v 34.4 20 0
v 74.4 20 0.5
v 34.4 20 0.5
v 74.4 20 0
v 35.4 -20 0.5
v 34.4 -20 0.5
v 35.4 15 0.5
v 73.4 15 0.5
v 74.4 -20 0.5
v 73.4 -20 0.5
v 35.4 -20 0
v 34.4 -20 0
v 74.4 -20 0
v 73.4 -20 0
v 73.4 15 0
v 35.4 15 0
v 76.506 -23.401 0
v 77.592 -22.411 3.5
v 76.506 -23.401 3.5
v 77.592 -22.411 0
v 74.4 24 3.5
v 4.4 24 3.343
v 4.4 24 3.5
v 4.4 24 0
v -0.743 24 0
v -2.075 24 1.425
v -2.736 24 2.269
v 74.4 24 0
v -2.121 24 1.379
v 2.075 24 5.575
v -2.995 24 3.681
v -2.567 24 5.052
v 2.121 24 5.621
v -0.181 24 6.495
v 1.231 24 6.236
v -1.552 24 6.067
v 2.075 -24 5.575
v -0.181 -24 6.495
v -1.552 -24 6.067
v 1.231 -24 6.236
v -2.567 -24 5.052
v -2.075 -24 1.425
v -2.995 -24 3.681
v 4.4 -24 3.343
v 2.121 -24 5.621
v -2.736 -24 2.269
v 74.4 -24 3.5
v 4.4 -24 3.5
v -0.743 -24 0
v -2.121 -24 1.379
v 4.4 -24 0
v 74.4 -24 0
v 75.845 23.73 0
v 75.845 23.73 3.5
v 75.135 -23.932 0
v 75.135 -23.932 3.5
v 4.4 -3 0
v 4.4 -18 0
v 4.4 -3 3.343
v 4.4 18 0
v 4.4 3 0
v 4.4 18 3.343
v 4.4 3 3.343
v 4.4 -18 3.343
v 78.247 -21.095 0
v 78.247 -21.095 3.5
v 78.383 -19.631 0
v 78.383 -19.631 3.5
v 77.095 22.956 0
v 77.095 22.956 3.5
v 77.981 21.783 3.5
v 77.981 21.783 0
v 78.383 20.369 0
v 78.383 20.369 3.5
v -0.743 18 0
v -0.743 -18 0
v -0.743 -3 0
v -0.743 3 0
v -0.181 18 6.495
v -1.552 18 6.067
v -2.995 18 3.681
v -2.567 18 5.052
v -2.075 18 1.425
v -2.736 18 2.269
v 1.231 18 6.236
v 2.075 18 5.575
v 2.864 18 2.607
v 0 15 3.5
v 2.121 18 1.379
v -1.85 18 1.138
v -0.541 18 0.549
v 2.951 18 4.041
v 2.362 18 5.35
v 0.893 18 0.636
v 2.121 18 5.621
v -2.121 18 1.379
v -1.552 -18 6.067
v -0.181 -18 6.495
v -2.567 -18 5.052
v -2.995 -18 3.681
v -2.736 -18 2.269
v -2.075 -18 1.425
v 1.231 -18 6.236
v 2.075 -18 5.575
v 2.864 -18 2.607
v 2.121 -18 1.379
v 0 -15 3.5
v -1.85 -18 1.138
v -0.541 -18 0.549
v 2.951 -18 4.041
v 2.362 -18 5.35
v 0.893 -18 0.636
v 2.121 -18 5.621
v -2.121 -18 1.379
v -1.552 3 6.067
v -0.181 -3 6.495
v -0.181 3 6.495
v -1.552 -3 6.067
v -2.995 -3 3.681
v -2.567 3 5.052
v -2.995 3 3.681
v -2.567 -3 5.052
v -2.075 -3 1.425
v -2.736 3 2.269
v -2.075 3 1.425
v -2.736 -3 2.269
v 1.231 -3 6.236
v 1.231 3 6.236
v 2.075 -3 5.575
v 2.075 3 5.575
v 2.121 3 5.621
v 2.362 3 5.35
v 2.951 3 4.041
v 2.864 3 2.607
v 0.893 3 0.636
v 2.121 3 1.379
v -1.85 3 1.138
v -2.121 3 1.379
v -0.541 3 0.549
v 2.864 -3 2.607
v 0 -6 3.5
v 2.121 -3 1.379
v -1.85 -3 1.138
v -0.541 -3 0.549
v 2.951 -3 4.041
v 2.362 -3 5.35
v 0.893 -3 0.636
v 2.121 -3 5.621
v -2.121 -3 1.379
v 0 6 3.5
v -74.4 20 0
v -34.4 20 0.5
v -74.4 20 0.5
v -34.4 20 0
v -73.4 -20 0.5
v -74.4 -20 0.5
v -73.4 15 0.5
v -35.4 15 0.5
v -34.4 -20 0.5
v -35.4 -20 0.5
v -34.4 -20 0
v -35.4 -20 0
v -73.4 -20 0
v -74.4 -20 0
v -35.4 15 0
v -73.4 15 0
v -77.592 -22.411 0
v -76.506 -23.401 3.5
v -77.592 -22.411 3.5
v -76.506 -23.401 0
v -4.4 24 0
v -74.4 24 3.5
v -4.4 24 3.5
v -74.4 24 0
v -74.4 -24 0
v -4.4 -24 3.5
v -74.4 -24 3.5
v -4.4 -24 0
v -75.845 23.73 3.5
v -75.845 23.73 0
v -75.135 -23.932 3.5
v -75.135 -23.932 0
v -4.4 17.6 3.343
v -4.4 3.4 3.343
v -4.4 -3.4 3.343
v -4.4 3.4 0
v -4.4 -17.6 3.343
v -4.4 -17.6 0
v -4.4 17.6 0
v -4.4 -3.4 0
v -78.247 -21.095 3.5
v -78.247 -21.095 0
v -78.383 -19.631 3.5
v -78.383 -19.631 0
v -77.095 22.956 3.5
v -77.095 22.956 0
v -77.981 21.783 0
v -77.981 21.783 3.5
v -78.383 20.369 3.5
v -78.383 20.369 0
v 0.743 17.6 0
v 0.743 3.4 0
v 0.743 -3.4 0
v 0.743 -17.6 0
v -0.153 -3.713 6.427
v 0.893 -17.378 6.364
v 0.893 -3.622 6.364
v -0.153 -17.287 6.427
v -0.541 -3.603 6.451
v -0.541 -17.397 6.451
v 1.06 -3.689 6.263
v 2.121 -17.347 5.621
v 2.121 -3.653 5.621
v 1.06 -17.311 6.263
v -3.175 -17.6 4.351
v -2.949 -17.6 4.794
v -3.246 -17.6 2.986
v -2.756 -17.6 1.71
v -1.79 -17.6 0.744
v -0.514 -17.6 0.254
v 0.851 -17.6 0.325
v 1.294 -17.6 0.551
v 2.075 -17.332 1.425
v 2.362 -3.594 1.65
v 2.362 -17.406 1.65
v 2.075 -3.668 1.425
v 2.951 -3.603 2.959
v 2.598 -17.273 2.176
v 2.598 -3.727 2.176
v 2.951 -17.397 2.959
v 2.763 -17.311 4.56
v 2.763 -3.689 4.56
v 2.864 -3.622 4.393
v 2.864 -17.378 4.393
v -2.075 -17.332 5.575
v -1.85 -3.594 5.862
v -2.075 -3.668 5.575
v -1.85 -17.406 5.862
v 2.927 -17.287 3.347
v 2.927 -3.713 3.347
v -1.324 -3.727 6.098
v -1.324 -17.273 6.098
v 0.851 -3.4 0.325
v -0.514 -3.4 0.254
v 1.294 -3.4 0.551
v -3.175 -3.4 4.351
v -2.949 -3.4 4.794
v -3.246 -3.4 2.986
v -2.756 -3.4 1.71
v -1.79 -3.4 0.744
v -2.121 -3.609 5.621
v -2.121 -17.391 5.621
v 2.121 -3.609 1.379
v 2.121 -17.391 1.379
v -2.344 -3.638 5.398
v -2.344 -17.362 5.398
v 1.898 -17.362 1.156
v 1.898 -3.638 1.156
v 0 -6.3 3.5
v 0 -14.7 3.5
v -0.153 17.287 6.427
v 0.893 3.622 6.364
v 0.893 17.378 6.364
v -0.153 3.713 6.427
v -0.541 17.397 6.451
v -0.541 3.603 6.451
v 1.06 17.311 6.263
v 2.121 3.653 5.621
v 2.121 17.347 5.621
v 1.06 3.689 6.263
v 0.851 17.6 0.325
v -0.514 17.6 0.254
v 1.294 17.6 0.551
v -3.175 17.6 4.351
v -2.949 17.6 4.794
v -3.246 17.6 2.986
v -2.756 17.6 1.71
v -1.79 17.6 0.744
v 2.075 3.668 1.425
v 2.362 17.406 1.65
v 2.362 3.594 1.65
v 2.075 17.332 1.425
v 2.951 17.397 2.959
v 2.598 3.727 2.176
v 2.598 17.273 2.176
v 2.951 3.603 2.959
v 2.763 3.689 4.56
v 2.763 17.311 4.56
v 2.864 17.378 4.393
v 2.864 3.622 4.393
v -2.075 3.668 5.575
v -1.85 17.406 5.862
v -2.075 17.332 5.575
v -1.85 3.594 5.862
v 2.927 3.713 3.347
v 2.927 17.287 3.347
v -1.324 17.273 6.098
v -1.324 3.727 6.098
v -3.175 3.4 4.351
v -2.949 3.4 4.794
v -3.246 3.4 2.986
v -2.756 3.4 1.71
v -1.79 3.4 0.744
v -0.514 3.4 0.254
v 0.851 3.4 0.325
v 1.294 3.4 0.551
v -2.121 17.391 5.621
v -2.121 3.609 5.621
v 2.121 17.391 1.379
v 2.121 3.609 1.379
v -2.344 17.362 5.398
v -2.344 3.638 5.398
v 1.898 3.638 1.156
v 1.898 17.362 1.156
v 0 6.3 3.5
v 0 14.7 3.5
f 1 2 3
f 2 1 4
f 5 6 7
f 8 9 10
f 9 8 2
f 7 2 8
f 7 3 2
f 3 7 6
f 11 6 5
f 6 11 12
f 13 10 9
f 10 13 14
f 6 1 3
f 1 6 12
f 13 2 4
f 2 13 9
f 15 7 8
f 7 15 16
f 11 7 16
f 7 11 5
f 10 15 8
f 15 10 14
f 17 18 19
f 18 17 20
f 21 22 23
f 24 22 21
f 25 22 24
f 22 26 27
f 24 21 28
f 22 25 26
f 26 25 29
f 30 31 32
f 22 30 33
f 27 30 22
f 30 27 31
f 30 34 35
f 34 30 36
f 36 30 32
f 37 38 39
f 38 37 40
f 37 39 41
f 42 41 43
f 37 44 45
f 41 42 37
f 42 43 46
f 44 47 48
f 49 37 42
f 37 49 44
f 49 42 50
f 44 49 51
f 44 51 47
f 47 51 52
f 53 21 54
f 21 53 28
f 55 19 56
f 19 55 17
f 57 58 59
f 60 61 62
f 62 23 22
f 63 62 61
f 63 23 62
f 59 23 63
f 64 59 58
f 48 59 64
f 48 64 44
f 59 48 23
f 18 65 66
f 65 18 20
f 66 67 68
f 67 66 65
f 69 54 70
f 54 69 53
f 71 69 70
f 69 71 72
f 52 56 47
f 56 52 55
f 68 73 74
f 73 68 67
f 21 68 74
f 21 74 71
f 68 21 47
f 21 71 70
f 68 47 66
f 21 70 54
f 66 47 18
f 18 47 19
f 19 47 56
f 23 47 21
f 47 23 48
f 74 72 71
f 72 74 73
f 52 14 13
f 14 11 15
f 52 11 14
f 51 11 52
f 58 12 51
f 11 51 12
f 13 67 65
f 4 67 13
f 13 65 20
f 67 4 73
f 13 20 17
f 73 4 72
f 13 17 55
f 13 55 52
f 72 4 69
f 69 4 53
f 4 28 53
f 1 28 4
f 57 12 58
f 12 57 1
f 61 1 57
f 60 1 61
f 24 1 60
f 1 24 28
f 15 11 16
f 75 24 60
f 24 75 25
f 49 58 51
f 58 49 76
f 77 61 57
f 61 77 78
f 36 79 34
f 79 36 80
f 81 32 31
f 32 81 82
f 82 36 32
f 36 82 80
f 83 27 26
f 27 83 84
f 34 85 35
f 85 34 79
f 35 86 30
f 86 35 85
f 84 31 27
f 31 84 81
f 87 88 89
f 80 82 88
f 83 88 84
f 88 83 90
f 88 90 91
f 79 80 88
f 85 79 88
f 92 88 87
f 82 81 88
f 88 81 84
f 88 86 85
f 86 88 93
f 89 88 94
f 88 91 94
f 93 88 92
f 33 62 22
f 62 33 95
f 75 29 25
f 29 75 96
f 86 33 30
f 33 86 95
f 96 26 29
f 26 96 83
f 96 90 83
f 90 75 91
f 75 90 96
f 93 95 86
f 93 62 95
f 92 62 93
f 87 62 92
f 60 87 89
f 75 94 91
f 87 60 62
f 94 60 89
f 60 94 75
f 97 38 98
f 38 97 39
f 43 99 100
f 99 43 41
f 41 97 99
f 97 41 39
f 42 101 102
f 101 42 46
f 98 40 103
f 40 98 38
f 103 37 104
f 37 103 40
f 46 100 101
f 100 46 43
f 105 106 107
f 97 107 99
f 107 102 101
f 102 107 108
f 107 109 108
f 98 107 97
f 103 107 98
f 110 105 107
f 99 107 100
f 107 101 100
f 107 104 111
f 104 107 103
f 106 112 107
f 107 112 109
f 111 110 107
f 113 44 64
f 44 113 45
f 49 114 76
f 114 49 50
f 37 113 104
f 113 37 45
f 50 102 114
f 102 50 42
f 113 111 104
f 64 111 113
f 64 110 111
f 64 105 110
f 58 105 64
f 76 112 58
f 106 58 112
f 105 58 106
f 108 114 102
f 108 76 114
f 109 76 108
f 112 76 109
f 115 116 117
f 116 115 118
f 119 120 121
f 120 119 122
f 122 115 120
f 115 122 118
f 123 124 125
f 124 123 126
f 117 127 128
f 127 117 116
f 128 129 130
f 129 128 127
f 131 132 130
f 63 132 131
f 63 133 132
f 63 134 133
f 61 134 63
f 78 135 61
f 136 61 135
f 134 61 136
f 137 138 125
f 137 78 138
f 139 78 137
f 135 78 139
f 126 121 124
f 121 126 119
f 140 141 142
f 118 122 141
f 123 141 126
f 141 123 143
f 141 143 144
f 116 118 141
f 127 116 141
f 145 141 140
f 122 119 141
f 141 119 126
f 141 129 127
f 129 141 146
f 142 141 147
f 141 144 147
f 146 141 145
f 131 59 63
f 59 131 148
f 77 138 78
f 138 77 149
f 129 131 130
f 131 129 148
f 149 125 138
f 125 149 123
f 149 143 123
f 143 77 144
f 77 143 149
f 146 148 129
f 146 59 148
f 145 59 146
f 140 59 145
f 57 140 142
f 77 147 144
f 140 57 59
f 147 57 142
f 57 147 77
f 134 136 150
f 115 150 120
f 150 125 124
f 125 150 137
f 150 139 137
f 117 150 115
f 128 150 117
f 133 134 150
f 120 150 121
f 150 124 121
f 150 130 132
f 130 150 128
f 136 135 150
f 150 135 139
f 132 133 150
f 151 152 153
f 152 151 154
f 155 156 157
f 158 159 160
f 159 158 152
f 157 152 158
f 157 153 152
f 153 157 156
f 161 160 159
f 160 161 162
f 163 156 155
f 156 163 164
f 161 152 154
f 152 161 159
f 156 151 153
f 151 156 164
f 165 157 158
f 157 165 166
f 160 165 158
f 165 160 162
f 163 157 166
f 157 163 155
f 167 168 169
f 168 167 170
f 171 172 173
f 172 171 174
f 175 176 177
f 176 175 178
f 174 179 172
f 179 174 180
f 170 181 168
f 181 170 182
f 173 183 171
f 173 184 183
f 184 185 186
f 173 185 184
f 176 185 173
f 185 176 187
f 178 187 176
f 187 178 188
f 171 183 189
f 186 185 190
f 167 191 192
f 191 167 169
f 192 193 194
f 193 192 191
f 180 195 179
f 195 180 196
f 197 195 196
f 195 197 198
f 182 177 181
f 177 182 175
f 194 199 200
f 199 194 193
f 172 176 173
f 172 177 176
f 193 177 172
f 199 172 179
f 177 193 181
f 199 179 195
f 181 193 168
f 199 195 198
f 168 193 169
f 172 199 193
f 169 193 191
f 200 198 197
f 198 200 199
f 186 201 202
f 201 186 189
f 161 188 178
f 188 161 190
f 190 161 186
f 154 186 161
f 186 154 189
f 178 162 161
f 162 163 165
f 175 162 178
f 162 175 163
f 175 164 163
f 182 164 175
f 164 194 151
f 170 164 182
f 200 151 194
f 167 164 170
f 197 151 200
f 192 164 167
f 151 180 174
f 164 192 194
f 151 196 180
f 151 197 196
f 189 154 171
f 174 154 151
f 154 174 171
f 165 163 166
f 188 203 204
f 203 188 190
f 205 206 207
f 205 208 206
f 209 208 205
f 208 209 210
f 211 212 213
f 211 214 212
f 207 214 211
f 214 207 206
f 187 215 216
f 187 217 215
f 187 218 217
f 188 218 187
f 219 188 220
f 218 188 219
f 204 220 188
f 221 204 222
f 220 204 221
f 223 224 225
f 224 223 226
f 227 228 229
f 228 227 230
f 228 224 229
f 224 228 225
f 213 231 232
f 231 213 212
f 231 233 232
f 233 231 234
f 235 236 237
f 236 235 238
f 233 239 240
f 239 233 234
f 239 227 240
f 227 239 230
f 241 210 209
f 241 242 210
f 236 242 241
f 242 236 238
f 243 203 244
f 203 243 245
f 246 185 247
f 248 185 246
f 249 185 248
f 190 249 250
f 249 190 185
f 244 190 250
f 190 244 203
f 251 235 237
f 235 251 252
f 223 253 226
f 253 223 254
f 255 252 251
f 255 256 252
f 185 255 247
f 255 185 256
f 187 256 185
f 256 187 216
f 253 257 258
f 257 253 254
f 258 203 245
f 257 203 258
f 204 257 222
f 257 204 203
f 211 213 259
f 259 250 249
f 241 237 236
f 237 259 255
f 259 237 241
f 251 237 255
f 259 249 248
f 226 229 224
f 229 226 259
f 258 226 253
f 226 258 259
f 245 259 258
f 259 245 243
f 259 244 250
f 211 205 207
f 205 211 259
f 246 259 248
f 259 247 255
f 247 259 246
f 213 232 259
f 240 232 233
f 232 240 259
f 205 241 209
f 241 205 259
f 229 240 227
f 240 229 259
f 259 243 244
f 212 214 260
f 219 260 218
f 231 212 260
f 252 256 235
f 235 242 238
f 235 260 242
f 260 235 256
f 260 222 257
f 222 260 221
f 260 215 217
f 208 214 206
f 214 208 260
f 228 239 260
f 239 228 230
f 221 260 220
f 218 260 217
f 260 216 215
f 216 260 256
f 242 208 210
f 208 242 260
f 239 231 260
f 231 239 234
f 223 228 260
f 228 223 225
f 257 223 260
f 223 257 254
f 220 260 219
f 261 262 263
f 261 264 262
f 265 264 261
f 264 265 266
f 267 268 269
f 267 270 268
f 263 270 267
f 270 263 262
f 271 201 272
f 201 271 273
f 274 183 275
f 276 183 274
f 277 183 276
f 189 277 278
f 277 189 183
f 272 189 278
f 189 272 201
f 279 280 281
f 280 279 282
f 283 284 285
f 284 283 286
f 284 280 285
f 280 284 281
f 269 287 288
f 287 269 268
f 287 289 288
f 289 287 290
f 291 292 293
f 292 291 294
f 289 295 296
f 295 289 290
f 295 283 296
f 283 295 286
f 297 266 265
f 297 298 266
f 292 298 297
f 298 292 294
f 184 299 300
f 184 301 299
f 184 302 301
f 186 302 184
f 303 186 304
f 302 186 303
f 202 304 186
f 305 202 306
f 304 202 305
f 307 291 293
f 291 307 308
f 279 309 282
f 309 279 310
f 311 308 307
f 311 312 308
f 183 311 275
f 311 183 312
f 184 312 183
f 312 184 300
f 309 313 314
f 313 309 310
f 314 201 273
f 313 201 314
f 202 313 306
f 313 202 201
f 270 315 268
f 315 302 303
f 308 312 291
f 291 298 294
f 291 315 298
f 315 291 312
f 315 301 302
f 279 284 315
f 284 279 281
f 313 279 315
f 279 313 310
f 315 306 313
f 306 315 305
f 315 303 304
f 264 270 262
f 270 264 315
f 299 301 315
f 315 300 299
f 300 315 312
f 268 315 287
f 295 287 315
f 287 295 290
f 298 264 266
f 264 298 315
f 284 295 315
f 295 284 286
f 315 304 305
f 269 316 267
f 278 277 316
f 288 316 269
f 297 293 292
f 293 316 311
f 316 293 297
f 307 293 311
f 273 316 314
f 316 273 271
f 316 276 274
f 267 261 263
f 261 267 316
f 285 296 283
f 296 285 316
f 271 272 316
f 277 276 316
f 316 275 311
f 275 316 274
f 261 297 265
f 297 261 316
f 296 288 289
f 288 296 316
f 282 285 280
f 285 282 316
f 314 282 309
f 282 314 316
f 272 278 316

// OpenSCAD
// preview[view:south, tilt:top];

// Simple photos with many shades of light/dark areas work best. Don't forget to click the Invert Colors checkbox!
image_file = ""; // [image_surface:100x100]



//Where would you like the hinge in relation to your image?
hinge_placement = 1; // [1:top,2:left,3:bottom,4:right]

//What height would you like for the embossed area (mm)?
emboss_height = 1.5;

/* [Hidden] */
$fa = 6;
$fs = 1.5;
image_width = 40;
image_length = 40;
image_padding = 4;

handle_width = image_width + image_padding*2;
handle_length = 70;
handle_height = emboss_height+2;
nub = 3; // hinge size
tol = 0.4; // spacing between hinge pieces

assembly();

module assembly() {
    stamp_top(90*hinge_placement);
    stamp_bottom(90*hinge_placement);   
}

module stamp_top(rot=90) {
    translate([1,0,0])
    union() {
        difference () {
          translate([handle_length + nub + tol, -handle_width/2, 0])
                rotate([0,0,90]) handle();
translate([handle_length-image_length/2+nub+tol,0,handle_height+0.4]) 
                rotate([0,180,rot]) plate();
	
 	            
        } 
   
        // hinge
        translate([-1,handle_width/2-2*nub,handle_height]) hinge_m();
        mirror([0,1,0]) translate([-1,handle_width/2-2*nub,handle_height]) hinge_m();
        translate([-1,-nub,handle_height]) hinge_m();
        mirror([0,1,0]) translate([-1,-nub,handle_height]) hinge_m();
    }
}

module stamp_bottom(rot=90) {
    translate([-1,0,0])
    union() {
        translate([-handle_length + image_length/2-nub-tol,0,handle_height]) 
            rotate([0,0,-rot]) plate();
        mirror([1,0,0]) translate([handle_length + nub + tol, -handle_width/2, 0]) 
            rotate([0,0,90]) handle();
        
        // hinge
        translate([1,-nub-tol,handle_height]) hinge_f();
        mirror([0,1,0]) translate([1,-nub-tol,handle_height]) hinge_f();
    }
}

module handle() {
    difference() {
        hull() {
            cube([handle_width, handle_length, handle_height]);
            translate([image_padding,0,0]) cylinder(r=image_padding, h=handle_height);
            translate([handle_width-image_padding,0,0]) cylinder(r=image_padding, h=handle_height);
        }
	guide();
    }

}

module guide() {
difference() {
translate([image_padding,0,-0.5]) 
        cube([image_width, image_length, 1]);	
translate([1,1,-0.5]) cube([image_width-2, image_length-2, 2]);    

        
}
}

module hinge_m() {
    difference () {
    	rotate([0,45,0]) union(){
            translate([0,0,-nub]) cube ([nub*3,nub*2, nub*2]);
            rotate([90,0,0]) {
                translate([0,0,-2*nub]) cylinder(r=nub,h=2*nub);
    		    cylinder(r1=nub,r2=0,h=nub);
            }
    	}
        translate([-nub,-nub/2,-handle_height-nub*5]) cube([nub*5, nub*3, nub*5]);
    }
}

module hinge_f() {
    len = handle_width/2 - 3*nub - 2*tol;
    
    difference() {
        rotate([90,-45,0]) 
        difference() {
            union() {
                cylinder(r=nub, h=len);
                translate([-3*nub,-nub,0]) cube([nub*3,nub*2,len]);
            }
            translate([0,0,-0.1]) cylinder(r1=nub+tol,r2=0,h=nub);
            translate([0,0,len-nub+0.1]) cylinder(r1=0,r2=nub+tol,h=nub);
        }
        translate([-nub*4,-len-nub/2,-handle_height-nub*5]) cube([nub*5, len+nub, nub*5]);
    }
}

module plate() {
    scale([(image_width)/100,(image_length)/100, emboss_height])
        surface(file=image_file, center=true, convexity=5);
}
